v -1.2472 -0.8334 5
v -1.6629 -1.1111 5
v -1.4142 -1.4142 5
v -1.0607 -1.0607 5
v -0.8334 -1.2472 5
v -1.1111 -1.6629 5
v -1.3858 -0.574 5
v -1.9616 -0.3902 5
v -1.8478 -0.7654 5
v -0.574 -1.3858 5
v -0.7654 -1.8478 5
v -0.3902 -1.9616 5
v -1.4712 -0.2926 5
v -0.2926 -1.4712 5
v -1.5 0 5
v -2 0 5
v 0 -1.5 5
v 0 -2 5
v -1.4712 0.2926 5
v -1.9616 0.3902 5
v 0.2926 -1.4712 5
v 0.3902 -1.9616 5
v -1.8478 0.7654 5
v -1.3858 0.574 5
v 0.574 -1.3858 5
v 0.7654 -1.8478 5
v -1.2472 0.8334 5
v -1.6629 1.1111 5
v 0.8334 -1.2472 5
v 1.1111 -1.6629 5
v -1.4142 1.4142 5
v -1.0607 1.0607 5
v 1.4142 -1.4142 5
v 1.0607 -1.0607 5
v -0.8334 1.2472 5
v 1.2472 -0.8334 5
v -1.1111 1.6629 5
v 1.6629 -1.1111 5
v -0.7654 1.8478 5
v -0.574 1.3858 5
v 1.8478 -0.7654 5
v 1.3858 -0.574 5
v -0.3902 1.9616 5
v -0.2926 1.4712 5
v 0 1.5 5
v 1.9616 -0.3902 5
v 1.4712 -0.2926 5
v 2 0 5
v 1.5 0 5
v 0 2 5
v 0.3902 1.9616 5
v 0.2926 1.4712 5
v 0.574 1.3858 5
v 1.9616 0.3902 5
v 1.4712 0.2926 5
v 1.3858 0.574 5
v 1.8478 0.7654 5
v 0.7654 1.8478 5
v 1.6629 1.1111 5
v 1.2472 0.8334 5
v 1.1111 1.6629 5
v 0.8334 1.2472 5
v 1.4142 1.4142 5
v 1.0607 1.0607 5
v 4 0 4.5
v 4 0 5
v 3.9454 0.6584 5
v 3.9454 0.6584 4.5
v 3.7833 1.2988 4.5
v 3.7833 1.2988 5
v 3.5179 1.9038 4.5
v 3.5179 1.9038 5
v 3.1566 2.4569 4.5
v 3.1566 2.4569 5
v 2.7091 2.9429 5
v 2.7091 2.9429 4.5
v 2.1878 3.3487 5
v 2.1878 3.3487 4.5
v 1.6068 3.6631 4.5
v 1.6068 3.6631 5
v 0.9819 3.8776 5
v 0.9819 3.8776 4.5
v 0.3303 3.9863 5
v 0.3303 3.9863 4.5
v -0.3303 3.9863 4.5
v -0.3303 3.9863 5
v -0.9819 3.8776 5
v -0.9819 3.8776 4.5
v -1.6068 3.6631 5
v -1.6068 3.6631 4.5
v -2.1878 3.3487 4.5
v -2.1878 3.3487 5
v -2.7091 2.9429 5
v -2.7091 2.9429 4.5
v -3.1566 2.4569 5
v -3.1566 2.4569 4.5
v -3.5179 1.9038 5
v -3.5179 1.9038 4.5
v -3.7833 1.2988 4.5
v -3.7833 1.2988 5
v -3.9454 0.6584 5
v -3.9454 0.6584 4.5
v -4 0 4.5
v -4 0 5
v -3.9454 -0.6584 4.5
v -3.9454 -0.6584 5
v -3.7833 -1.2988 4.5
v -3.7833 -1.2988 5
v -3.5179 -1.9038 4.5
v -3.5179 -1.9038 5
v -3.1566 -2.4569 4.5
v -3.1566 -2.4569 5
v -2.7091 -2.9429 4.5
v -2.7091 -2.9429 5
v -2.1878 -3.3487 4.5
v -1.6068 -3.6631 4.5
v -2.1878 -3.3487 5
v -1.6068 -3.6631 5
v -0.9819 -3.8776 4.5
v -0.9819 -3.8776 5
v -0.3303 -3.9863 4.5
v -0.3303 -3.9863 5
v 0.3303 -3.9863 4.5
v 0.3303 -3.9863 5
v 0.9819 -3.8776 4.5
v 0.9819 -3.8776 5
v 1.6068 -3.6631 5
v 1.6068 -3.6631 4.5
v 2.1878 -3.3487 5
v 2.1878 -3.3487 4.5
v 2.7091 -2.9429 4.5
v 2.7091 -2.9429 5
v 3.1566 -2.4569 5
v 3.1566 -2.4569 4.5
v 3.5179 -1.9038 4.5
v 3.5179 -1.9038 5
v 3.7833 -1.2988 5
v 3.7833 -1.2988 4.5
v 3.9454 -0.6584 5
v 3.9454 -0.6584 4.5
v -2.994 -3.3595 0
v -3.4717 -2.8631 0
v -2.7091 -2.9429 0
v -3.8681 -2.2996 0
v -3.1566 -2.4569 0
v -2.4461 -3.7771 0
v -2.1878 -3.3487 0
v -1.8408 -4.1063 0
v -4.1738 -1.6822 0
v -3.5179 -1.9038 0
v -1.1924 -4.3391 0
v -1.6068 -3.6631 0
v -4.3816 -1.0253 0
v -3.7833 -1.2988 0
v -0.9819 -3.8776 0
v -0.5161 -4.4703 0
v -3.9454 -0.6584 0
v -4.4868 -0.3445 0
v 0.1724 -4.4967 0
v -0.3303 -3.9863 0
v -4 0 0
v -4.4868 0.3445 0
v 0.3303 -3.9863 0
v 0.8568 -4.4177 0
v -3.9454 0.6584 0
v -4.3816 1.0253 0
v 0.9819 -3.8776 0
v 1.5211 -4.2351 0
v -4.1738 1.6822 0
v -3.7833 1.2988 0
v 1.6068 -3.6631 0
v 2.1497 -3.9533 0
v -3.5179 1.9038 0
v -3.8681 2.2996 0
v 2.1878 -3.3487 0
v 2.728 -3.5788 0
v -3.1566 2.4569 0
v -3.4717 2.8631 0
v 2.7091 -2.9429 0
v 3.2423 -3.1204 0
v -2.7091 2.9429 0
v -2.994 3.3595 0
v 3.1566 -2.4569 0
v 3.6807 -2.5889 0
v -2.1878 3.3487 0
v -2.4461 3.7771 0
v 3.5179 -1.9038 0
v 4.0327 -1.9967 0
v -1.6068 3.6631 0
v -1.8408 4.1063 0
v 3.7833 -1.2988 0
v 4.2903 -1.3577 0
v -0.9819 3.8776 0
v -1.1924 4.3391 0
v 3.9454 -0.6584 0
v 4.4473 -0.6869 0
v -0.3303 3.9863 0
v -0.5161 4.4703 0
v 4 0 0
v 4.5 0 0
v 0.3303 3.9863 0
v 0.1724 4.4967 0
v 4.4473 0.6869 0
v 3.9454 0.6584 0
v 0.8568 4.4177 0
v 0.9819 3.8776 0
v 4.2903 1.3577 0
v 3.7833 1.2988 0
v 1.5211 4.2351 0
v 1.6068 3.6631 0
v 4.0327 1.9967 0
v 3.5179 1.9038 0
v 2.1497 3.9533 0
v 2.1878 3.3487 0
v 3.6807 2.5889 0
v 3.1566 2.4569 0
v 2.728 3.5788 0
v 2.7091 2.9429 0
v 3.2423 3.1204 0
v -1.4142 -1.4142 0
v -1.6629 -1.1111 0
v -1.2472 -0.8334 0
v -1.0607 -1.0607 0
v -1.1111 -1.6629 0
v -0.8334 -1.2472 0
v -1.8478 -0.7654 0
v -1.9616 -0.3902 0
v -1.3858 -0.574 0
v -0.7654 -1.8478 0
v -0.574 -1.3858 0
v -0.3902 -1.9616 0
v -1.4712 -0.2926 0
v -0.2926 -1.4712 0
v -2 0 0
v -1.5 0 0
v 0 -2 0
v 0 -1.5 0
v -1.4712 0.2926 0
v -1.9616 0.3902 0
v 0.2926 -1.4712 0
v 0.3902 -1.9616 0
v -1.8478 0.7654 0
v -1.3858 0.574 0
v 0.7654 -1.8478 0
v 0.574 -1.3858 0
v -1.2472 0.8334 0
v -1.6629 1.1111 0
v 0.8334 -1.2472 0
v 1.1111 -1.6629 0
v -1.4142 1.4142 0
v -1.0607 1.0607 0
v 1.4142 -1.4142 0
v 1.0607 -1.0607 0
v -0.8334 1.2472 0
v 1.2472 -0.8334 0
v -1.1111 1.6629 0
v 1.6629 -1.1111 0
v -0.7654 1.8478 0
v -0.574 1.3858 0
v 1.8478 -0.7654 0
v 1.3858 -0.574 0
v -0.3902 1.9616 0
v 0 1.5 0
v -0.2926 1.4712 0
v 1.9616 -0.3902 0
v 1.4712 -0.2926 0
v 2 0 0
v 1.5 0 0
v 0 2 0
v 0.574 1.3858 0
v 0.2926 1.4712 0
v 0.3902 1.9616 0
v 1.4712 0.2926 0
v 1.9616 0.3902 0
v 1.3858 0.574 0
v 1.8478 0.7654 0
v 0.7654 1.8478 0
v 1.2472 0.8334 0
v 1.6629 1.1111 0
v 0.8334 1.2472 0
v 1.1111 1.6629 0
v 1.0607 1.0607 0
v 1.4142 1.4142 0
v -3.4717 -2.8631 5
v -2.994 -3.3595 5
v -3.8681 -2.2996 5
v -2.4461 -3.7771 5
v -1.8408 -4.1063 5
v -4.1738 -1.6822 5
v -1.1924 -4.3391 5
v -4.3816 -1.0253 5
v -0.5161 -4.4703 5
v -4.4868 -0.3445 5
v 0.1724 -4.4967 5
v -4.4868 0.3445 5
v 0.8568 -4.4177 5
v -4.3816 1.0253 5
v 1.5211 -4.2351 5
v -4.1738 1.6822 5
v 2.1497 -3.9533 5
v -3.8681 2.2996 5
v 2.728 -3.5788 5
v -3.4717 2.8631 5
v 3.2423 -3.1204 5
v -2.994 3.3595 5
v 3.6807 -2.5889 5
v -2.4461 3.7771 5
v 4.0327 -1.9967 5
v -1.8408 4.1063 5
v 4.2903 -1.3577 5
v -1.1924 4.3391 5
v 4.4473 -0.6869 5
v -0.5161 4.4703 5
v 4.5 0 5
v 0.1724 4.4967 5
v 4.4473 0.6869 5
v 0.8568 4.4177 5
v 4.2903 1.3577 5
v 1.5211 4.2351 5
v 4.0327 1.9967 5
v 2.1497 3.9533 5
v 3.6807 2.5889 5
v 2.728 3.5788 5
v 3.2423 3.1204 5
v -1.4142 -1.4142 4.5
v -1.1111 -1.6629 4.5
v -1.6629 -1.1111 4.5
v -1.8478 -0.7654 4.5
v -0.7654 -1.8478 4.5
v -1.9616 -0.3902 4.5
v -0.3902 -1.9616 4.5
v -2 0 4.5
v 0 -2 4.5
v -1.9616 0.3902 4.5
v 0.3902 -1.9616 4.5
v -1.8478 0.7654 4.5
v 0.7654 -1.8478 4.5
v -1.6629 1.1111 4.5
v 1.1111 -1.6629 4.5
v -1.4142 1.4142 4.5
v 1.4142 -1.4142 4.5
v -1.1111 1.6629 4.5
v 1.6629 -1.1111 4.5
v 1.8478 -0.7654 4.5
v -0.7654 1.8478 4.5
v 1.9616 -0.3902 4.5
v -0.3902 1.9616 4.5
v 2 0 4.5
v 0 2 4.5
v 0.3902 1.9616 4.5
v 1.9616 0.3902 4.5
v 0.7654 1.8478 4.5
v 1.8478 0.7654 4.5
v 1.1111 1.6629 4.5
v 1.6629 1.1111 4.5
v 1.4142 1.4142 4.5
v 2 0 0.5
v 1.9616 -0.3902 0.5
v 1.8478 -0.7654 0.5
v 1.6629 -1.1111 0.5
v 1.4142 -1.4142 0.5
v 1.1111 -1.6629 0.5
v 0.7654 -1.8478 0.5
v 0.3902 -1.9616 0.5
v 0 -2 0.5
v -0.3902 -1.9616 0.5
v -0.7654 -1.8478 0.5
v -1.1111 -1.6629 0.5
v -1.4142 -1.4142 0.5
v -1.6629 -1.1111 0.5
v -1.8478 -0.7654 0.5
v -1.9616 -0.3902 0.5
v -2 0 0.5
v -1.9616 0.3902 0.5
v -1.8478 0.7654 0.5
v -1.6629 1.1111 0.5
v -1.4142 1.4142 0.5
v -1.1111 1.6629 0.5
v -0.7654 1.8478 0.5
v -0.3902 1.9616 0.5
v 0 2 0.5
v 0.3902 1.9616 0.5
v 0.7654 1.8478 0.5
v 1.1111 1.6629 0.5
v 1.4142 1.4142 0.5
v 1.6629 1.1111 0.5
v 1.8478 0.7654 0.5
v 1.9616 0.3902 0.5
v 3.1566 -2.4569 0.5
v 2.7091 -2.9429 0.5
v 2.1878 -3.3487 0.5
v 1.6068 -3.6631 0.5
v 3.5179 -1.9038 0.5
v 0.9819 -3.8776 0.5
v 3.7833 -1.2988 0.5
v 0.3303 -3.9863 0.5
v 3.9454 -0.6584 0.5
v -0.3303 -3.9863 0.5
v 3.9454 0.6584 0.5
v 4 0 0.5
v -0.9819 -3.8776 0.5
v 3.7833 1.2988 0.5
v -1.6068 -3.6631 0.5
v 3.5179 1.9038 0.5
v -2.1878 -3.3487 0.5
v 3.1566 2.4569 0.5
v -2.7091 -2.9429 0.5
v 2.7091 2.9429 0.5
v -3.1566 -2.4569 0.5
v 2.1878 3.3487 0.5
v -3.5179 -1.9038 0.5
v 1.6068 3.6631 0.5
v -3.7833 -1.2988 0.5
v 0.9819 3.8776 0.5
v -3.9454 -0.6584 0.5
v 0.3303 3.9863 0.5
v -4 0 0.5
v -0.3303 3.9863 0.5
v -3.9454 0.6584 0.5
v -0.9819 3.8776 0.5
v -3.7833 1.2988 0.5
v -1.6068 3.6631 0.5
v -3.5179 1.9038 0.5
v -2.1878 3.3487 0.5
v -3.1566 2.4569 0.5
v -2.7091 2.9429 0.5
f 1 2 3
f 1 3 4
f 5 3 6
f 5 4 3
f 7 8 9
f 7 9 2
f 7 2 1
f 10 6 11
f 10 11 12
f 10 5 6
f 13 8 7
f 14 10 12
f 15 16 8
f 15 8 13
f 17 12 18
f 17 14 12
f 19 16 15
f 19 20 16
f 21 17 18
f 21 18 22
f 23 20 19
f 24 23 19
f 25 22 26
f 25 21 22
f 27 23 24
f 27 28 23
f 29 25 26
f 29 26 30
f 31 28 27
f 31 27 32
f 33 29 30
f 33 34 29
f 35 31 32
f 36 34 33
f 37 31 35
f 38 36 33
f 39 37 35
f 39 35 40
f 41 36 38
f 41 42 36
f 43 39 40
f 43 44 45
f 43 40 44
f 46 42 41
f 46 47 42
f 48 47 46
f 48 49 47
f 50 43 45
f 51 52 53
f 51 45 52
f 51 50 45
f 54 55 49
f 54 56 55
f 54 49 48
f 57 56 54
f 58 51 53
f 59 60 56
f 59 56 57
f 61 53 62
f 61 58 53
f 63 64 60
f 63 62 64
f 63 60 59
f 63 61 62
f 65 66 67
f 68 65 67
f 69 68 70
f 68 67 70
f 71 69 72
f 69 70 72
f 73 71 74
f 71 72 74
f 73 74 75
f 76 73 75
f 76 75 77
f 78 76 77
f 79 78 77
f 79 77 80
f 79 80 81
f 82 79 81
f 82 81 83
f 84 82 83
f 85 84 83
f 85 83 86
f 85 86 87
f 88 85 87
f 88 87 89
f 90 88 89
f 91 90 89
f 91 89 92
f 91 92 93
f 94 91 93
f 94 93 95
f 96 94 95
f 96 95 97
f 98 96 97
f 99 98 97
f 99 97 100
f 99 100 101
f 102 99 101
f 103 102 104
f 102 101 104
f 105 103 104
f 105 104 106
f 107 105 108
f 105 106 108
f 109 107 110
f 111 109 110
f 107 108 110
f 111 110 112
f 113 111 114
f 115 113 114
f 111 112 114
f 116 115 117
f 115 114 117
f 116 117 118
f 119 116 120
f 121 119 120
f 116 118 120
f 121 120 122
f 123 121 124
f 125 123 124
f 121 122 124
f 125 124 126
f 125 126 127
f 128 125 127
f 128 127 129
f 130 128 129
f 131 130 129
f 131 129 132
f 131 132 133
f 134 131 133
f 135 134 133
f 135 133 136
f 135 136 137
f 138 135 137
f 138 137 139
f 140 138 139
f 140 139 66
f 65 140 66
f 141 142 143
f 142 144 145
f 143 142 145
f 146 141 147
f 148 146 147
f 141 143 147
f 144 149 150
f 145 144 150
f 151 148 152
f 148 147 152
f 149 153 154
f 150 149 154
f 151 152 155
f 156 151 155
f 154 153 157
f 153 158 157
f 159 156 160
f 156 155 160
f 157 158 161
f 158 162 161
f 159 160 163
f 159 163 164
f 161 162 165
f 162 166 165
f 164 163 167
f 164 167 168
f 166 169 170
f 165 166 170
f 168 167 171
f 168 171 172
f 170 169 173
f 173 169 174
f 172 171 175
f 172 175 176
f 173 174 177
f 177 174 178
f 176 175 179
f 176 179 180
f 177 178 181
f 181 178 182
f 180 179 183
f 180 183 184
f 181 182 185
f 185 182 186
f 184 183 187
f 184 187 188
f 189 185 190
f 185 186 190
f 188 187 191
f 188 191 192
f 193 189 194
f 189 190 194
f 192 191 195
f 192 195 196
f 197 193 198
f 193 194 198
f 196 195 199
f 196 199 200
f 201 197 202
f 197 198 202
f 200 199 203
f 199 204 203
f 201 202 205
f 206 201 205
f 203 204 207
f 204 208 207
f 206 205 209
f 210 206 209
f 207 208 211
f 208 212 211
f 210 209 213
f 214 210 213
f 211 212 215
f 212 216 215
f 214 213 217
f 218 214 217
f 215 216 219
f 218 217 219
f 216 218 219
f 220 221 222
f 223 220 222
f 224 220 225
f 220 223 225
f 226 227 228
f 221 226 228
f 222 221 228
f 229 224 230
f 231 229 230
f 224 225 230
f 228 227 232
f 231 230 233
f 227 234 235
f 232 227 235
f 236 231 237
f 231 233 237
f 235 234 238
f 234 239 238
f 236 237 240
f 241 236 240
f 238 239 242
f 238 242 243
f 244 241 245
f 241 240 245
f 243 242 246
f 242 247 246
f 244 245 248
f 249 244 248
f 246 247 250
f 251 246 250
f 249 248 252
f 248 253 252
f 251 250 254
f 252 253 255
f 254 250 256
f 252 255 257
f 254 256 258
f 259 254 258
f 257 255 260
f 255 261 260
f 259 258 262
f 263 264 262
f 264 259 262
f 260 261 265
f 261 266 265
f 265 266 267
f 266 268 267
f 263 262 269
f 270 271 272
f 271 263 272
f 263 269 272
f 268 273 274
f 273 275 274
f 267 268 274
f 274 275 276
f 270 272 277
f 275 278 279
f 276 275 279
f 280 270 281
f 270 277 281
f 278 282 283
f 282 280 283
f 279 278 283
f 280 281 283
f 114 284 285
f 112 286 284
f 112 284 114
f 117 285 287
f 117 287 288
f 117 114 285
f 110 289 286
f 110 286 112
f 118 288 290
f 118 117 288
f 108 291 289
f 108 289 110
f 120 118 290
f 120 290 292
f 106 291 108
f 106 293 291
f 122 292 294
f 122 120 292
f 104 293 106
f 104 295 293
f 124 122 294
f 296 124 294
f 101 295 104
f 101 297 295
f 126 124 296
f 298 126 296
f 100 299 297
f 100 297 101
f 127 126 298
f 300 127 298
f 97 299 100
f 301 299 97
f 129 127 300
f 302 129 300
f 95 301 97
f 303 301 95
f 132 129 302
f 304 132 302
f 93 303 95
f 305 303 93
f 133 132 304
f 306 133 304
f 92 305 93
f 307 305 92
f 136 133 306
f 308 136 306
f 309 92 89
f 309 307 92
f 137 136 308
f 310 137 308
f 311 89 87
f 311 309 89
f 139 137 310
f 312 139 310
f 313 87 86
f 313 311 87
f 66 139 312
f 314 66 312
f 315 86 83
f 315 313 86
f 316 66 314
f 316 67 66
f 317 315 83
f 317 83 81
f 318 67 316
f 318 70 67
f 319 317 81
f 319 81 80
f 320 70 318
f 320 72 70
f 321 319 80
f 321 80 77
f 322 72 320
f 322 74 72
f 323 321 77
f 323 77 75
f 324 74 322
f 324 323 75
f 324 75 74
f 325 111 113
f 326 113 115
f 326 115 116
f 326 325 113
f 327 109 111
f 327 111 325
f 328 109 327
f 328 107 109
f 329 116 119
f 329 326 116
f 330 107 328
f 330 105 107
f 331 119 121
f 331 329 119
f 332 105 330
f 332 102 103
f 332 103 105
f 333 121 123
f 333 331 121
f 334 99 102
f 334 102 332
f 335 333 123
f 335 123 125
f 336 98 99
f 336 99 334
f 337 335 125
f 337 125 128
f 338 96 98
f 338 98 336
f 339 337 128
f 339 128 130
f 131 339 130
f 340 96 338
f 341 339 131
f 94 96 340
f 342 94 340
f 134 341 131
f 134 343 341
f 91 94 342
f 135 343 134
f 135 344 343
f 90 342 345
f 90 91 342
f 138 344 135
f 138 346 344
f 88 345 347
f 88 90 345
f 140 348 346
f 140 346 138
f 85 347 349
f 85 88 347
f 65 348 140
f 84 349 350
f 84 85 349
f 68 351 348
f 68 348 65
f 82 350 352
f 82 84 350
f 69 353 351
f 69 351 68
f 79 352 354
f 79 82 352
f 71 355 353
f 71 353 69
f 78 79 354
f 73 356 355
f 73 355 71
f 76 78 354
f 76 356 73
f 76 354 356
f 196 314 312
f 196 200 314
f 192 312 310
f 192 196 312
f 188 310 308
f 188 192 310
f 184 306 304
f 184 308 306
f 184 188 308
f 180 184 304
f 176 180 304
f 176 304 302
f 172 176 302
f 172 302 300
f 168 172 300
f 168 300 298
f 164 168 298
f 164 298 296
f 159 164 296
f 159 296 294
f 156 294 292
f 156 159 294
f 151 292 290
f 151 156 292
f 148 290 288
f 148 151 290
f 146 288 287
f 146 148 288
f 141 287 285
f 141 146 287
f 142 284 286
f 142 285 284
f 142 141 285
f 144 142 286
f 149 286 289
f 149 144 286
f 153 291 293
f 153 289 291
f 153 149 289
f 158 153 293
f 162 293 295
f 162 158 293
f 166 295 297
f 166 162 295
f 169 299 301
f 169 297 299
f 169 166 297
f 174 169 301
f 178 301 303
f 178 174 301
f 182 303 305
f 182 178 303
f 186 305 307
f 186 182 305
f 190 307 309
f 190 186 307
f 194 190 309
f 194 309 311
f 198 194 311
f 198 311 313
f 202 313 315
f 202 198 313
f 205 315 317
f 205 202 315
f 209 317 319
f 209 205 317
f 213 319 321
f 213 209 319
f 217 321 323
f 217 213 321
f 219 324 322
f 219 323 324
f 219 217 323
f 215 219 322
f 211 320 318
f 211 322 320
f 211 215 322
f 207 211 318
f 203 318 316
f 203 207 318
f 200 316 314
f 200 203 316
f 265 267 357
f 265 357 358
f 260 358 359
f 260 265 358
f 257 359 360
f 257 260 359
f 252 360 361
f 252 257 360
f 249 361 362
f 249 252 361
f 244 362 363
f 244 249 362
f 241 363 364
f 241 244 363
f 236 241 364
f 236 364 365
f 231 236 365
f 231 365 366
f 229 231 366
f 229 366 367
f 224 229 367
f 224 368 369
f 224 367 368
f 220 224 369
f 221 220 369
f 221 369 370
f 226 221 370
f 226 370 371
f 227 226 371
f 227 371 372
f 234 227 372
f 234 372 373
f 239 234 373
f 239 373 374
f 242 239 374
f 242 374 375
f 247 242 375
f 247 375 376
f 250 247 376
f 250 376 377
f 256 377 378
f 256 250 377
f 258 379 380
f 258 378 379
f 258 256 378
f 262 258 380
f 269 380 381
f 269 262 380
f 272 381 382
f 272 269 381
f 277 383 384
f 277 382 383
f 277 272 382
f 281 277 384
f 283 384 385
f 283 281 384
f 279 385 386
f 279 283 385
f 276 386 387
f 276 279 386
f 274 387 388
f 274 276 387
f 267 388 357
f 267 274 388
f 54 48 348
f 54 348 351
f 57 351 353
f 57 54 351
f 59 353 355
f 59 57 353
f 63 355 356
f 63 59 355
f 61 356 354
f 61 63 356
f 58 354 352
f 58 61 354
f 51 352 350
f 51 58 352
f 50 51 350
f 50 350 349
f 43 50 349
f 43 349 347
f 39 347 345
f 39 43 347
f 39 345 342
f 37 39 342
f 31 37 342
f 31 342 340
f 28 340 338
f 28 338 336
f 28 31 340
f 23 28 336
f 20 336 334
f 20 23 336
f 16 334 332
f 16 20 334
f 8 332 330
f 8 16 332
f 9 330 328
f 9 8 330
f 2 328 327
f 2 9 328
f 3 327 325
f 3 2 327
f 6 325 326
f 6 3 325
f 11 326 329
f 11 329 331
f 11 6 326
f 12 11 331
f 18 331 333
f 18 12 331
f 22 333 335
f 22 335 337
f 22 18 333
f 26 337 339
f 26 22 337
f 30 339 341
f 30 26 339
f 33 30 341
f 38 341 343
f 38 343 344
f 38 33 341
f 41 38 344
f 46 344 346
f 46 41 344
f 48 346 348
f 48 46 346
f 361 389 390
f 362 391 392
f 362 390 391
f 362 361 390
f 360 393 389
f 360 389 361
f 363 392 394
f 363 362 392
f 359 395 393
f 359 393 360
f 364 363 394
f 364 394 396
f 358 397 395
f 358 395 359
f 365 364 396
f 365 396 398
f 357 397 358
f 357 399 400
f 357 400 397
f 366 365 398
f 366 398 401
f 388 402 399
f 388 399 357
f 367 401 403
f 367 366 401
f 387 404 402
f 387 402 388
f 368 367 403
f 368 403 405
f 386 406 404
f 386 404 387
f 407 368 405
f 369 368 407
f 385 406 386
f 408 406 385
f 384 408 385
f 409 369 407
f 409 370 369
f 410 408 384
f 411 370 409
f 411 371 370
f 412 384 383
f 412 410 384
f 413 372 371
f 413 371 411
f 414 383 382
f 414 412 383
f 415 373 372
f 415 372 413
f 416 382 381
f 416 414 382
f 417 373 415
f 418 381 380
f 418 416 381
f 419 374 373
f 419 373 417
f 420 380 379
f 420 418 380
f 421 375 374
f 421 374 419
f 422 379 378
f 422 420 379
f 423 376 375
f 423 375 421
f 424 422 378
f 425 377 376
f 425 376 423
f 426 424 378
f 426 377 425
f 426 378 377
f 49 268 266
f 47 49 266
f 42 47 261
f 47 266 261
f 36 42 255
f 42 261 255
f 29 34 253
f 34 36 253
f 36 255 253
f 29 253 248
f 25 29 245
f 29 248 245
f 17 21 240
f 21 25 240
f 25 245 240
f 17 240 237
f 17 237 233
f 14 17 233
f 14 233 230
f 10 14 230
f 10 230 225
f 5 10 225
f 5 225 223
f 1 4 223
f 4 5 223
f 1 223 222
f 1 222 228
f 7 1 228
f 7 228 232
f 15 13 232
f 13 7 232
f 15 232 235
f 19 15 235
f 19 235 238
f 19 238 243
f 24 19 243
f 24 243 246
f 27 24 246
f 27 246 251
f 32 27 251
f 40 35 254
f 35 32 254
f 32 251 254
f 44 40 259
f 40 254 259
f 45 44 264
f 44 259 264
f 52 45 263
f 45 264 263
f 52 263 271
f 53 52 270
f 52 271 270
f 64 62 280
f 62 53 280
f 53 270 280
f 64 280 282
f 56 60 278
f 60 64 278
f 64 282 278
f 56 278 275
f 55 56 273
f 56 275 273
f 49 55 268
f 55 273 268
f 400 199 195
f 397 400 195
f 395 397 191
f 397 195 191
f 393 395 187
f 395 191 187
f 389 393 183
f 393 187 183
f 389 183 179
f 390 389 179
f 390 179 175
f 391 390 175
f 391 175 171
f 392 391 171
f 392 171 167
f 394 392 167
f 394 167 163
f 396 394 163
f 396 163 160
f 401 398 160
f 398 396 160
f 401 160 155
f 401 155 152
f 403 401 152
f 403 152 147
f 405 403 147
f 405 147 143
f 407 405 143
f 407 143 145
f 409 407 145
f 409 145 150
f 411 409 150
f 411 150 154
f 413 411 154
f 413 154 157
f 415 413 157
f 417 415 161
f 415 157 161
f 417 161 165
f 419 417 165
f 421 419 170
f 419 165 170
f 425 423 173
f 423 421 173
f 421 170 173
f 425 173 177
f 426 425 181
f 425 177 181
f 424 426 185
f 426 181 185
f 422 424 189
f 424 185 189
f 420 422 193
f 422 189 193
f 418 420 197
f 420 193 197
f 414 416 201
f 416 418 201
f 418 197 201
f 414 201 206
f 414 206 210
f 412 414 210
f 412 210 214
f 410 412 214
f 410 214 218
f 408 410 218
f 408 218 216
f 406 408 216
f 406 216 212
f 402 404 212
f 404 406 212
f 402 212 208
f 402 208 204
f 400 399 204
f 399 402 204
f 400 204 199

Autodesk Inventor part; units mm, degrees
ref_plane "YZ Plane" through (0, 0, 0) normal (1, 0, 0) x (0, 1, 0)
ref_plane "XZ Plane" through (0, 0, 0) normal (0, 1, 0) x (-1, 0, 0)
sketch "Sketch1" plane through (0, 0, 0) normal (0, 0, 1) x (1, 0, 0)
  circle A0 centre (0, 0) radius 1.5
  circle A1 centre (0, 0) radius 4.5
  dimension "d0" = 3
  dimension "d1" = 9
extrude "Extrusion1" add sketch "Sketch1" along normal blind 5
sketch "Sketch2" plane through (0, 0, 5) normal (0, 0, 1) x (1, 0, 0)
  circle A0 centre (0, 0) radius 4.5 projected
  circle A1 centre (0, 0) radius 1.5 projected
  circle A2 centre (0, 0) radius 2
  circle A3 centre (0, 0) radius 4
  dimension "d4" = 0.5
  dimension "d5" = 0.5
extrude "Extrusion2" cut sketch "Sketch2" against normal blind 0.5 contours A3
ref_plane "Work Plane1" through (0, 0, 2.5) normal (0, 0, 1) x (1, 0, 0)
mirror "Mirror1" about plane through (0, 0, 2.5) normal (0, 0, 1) of "Extrusion2"
properties part number "603ZZ Roller Bearing"
